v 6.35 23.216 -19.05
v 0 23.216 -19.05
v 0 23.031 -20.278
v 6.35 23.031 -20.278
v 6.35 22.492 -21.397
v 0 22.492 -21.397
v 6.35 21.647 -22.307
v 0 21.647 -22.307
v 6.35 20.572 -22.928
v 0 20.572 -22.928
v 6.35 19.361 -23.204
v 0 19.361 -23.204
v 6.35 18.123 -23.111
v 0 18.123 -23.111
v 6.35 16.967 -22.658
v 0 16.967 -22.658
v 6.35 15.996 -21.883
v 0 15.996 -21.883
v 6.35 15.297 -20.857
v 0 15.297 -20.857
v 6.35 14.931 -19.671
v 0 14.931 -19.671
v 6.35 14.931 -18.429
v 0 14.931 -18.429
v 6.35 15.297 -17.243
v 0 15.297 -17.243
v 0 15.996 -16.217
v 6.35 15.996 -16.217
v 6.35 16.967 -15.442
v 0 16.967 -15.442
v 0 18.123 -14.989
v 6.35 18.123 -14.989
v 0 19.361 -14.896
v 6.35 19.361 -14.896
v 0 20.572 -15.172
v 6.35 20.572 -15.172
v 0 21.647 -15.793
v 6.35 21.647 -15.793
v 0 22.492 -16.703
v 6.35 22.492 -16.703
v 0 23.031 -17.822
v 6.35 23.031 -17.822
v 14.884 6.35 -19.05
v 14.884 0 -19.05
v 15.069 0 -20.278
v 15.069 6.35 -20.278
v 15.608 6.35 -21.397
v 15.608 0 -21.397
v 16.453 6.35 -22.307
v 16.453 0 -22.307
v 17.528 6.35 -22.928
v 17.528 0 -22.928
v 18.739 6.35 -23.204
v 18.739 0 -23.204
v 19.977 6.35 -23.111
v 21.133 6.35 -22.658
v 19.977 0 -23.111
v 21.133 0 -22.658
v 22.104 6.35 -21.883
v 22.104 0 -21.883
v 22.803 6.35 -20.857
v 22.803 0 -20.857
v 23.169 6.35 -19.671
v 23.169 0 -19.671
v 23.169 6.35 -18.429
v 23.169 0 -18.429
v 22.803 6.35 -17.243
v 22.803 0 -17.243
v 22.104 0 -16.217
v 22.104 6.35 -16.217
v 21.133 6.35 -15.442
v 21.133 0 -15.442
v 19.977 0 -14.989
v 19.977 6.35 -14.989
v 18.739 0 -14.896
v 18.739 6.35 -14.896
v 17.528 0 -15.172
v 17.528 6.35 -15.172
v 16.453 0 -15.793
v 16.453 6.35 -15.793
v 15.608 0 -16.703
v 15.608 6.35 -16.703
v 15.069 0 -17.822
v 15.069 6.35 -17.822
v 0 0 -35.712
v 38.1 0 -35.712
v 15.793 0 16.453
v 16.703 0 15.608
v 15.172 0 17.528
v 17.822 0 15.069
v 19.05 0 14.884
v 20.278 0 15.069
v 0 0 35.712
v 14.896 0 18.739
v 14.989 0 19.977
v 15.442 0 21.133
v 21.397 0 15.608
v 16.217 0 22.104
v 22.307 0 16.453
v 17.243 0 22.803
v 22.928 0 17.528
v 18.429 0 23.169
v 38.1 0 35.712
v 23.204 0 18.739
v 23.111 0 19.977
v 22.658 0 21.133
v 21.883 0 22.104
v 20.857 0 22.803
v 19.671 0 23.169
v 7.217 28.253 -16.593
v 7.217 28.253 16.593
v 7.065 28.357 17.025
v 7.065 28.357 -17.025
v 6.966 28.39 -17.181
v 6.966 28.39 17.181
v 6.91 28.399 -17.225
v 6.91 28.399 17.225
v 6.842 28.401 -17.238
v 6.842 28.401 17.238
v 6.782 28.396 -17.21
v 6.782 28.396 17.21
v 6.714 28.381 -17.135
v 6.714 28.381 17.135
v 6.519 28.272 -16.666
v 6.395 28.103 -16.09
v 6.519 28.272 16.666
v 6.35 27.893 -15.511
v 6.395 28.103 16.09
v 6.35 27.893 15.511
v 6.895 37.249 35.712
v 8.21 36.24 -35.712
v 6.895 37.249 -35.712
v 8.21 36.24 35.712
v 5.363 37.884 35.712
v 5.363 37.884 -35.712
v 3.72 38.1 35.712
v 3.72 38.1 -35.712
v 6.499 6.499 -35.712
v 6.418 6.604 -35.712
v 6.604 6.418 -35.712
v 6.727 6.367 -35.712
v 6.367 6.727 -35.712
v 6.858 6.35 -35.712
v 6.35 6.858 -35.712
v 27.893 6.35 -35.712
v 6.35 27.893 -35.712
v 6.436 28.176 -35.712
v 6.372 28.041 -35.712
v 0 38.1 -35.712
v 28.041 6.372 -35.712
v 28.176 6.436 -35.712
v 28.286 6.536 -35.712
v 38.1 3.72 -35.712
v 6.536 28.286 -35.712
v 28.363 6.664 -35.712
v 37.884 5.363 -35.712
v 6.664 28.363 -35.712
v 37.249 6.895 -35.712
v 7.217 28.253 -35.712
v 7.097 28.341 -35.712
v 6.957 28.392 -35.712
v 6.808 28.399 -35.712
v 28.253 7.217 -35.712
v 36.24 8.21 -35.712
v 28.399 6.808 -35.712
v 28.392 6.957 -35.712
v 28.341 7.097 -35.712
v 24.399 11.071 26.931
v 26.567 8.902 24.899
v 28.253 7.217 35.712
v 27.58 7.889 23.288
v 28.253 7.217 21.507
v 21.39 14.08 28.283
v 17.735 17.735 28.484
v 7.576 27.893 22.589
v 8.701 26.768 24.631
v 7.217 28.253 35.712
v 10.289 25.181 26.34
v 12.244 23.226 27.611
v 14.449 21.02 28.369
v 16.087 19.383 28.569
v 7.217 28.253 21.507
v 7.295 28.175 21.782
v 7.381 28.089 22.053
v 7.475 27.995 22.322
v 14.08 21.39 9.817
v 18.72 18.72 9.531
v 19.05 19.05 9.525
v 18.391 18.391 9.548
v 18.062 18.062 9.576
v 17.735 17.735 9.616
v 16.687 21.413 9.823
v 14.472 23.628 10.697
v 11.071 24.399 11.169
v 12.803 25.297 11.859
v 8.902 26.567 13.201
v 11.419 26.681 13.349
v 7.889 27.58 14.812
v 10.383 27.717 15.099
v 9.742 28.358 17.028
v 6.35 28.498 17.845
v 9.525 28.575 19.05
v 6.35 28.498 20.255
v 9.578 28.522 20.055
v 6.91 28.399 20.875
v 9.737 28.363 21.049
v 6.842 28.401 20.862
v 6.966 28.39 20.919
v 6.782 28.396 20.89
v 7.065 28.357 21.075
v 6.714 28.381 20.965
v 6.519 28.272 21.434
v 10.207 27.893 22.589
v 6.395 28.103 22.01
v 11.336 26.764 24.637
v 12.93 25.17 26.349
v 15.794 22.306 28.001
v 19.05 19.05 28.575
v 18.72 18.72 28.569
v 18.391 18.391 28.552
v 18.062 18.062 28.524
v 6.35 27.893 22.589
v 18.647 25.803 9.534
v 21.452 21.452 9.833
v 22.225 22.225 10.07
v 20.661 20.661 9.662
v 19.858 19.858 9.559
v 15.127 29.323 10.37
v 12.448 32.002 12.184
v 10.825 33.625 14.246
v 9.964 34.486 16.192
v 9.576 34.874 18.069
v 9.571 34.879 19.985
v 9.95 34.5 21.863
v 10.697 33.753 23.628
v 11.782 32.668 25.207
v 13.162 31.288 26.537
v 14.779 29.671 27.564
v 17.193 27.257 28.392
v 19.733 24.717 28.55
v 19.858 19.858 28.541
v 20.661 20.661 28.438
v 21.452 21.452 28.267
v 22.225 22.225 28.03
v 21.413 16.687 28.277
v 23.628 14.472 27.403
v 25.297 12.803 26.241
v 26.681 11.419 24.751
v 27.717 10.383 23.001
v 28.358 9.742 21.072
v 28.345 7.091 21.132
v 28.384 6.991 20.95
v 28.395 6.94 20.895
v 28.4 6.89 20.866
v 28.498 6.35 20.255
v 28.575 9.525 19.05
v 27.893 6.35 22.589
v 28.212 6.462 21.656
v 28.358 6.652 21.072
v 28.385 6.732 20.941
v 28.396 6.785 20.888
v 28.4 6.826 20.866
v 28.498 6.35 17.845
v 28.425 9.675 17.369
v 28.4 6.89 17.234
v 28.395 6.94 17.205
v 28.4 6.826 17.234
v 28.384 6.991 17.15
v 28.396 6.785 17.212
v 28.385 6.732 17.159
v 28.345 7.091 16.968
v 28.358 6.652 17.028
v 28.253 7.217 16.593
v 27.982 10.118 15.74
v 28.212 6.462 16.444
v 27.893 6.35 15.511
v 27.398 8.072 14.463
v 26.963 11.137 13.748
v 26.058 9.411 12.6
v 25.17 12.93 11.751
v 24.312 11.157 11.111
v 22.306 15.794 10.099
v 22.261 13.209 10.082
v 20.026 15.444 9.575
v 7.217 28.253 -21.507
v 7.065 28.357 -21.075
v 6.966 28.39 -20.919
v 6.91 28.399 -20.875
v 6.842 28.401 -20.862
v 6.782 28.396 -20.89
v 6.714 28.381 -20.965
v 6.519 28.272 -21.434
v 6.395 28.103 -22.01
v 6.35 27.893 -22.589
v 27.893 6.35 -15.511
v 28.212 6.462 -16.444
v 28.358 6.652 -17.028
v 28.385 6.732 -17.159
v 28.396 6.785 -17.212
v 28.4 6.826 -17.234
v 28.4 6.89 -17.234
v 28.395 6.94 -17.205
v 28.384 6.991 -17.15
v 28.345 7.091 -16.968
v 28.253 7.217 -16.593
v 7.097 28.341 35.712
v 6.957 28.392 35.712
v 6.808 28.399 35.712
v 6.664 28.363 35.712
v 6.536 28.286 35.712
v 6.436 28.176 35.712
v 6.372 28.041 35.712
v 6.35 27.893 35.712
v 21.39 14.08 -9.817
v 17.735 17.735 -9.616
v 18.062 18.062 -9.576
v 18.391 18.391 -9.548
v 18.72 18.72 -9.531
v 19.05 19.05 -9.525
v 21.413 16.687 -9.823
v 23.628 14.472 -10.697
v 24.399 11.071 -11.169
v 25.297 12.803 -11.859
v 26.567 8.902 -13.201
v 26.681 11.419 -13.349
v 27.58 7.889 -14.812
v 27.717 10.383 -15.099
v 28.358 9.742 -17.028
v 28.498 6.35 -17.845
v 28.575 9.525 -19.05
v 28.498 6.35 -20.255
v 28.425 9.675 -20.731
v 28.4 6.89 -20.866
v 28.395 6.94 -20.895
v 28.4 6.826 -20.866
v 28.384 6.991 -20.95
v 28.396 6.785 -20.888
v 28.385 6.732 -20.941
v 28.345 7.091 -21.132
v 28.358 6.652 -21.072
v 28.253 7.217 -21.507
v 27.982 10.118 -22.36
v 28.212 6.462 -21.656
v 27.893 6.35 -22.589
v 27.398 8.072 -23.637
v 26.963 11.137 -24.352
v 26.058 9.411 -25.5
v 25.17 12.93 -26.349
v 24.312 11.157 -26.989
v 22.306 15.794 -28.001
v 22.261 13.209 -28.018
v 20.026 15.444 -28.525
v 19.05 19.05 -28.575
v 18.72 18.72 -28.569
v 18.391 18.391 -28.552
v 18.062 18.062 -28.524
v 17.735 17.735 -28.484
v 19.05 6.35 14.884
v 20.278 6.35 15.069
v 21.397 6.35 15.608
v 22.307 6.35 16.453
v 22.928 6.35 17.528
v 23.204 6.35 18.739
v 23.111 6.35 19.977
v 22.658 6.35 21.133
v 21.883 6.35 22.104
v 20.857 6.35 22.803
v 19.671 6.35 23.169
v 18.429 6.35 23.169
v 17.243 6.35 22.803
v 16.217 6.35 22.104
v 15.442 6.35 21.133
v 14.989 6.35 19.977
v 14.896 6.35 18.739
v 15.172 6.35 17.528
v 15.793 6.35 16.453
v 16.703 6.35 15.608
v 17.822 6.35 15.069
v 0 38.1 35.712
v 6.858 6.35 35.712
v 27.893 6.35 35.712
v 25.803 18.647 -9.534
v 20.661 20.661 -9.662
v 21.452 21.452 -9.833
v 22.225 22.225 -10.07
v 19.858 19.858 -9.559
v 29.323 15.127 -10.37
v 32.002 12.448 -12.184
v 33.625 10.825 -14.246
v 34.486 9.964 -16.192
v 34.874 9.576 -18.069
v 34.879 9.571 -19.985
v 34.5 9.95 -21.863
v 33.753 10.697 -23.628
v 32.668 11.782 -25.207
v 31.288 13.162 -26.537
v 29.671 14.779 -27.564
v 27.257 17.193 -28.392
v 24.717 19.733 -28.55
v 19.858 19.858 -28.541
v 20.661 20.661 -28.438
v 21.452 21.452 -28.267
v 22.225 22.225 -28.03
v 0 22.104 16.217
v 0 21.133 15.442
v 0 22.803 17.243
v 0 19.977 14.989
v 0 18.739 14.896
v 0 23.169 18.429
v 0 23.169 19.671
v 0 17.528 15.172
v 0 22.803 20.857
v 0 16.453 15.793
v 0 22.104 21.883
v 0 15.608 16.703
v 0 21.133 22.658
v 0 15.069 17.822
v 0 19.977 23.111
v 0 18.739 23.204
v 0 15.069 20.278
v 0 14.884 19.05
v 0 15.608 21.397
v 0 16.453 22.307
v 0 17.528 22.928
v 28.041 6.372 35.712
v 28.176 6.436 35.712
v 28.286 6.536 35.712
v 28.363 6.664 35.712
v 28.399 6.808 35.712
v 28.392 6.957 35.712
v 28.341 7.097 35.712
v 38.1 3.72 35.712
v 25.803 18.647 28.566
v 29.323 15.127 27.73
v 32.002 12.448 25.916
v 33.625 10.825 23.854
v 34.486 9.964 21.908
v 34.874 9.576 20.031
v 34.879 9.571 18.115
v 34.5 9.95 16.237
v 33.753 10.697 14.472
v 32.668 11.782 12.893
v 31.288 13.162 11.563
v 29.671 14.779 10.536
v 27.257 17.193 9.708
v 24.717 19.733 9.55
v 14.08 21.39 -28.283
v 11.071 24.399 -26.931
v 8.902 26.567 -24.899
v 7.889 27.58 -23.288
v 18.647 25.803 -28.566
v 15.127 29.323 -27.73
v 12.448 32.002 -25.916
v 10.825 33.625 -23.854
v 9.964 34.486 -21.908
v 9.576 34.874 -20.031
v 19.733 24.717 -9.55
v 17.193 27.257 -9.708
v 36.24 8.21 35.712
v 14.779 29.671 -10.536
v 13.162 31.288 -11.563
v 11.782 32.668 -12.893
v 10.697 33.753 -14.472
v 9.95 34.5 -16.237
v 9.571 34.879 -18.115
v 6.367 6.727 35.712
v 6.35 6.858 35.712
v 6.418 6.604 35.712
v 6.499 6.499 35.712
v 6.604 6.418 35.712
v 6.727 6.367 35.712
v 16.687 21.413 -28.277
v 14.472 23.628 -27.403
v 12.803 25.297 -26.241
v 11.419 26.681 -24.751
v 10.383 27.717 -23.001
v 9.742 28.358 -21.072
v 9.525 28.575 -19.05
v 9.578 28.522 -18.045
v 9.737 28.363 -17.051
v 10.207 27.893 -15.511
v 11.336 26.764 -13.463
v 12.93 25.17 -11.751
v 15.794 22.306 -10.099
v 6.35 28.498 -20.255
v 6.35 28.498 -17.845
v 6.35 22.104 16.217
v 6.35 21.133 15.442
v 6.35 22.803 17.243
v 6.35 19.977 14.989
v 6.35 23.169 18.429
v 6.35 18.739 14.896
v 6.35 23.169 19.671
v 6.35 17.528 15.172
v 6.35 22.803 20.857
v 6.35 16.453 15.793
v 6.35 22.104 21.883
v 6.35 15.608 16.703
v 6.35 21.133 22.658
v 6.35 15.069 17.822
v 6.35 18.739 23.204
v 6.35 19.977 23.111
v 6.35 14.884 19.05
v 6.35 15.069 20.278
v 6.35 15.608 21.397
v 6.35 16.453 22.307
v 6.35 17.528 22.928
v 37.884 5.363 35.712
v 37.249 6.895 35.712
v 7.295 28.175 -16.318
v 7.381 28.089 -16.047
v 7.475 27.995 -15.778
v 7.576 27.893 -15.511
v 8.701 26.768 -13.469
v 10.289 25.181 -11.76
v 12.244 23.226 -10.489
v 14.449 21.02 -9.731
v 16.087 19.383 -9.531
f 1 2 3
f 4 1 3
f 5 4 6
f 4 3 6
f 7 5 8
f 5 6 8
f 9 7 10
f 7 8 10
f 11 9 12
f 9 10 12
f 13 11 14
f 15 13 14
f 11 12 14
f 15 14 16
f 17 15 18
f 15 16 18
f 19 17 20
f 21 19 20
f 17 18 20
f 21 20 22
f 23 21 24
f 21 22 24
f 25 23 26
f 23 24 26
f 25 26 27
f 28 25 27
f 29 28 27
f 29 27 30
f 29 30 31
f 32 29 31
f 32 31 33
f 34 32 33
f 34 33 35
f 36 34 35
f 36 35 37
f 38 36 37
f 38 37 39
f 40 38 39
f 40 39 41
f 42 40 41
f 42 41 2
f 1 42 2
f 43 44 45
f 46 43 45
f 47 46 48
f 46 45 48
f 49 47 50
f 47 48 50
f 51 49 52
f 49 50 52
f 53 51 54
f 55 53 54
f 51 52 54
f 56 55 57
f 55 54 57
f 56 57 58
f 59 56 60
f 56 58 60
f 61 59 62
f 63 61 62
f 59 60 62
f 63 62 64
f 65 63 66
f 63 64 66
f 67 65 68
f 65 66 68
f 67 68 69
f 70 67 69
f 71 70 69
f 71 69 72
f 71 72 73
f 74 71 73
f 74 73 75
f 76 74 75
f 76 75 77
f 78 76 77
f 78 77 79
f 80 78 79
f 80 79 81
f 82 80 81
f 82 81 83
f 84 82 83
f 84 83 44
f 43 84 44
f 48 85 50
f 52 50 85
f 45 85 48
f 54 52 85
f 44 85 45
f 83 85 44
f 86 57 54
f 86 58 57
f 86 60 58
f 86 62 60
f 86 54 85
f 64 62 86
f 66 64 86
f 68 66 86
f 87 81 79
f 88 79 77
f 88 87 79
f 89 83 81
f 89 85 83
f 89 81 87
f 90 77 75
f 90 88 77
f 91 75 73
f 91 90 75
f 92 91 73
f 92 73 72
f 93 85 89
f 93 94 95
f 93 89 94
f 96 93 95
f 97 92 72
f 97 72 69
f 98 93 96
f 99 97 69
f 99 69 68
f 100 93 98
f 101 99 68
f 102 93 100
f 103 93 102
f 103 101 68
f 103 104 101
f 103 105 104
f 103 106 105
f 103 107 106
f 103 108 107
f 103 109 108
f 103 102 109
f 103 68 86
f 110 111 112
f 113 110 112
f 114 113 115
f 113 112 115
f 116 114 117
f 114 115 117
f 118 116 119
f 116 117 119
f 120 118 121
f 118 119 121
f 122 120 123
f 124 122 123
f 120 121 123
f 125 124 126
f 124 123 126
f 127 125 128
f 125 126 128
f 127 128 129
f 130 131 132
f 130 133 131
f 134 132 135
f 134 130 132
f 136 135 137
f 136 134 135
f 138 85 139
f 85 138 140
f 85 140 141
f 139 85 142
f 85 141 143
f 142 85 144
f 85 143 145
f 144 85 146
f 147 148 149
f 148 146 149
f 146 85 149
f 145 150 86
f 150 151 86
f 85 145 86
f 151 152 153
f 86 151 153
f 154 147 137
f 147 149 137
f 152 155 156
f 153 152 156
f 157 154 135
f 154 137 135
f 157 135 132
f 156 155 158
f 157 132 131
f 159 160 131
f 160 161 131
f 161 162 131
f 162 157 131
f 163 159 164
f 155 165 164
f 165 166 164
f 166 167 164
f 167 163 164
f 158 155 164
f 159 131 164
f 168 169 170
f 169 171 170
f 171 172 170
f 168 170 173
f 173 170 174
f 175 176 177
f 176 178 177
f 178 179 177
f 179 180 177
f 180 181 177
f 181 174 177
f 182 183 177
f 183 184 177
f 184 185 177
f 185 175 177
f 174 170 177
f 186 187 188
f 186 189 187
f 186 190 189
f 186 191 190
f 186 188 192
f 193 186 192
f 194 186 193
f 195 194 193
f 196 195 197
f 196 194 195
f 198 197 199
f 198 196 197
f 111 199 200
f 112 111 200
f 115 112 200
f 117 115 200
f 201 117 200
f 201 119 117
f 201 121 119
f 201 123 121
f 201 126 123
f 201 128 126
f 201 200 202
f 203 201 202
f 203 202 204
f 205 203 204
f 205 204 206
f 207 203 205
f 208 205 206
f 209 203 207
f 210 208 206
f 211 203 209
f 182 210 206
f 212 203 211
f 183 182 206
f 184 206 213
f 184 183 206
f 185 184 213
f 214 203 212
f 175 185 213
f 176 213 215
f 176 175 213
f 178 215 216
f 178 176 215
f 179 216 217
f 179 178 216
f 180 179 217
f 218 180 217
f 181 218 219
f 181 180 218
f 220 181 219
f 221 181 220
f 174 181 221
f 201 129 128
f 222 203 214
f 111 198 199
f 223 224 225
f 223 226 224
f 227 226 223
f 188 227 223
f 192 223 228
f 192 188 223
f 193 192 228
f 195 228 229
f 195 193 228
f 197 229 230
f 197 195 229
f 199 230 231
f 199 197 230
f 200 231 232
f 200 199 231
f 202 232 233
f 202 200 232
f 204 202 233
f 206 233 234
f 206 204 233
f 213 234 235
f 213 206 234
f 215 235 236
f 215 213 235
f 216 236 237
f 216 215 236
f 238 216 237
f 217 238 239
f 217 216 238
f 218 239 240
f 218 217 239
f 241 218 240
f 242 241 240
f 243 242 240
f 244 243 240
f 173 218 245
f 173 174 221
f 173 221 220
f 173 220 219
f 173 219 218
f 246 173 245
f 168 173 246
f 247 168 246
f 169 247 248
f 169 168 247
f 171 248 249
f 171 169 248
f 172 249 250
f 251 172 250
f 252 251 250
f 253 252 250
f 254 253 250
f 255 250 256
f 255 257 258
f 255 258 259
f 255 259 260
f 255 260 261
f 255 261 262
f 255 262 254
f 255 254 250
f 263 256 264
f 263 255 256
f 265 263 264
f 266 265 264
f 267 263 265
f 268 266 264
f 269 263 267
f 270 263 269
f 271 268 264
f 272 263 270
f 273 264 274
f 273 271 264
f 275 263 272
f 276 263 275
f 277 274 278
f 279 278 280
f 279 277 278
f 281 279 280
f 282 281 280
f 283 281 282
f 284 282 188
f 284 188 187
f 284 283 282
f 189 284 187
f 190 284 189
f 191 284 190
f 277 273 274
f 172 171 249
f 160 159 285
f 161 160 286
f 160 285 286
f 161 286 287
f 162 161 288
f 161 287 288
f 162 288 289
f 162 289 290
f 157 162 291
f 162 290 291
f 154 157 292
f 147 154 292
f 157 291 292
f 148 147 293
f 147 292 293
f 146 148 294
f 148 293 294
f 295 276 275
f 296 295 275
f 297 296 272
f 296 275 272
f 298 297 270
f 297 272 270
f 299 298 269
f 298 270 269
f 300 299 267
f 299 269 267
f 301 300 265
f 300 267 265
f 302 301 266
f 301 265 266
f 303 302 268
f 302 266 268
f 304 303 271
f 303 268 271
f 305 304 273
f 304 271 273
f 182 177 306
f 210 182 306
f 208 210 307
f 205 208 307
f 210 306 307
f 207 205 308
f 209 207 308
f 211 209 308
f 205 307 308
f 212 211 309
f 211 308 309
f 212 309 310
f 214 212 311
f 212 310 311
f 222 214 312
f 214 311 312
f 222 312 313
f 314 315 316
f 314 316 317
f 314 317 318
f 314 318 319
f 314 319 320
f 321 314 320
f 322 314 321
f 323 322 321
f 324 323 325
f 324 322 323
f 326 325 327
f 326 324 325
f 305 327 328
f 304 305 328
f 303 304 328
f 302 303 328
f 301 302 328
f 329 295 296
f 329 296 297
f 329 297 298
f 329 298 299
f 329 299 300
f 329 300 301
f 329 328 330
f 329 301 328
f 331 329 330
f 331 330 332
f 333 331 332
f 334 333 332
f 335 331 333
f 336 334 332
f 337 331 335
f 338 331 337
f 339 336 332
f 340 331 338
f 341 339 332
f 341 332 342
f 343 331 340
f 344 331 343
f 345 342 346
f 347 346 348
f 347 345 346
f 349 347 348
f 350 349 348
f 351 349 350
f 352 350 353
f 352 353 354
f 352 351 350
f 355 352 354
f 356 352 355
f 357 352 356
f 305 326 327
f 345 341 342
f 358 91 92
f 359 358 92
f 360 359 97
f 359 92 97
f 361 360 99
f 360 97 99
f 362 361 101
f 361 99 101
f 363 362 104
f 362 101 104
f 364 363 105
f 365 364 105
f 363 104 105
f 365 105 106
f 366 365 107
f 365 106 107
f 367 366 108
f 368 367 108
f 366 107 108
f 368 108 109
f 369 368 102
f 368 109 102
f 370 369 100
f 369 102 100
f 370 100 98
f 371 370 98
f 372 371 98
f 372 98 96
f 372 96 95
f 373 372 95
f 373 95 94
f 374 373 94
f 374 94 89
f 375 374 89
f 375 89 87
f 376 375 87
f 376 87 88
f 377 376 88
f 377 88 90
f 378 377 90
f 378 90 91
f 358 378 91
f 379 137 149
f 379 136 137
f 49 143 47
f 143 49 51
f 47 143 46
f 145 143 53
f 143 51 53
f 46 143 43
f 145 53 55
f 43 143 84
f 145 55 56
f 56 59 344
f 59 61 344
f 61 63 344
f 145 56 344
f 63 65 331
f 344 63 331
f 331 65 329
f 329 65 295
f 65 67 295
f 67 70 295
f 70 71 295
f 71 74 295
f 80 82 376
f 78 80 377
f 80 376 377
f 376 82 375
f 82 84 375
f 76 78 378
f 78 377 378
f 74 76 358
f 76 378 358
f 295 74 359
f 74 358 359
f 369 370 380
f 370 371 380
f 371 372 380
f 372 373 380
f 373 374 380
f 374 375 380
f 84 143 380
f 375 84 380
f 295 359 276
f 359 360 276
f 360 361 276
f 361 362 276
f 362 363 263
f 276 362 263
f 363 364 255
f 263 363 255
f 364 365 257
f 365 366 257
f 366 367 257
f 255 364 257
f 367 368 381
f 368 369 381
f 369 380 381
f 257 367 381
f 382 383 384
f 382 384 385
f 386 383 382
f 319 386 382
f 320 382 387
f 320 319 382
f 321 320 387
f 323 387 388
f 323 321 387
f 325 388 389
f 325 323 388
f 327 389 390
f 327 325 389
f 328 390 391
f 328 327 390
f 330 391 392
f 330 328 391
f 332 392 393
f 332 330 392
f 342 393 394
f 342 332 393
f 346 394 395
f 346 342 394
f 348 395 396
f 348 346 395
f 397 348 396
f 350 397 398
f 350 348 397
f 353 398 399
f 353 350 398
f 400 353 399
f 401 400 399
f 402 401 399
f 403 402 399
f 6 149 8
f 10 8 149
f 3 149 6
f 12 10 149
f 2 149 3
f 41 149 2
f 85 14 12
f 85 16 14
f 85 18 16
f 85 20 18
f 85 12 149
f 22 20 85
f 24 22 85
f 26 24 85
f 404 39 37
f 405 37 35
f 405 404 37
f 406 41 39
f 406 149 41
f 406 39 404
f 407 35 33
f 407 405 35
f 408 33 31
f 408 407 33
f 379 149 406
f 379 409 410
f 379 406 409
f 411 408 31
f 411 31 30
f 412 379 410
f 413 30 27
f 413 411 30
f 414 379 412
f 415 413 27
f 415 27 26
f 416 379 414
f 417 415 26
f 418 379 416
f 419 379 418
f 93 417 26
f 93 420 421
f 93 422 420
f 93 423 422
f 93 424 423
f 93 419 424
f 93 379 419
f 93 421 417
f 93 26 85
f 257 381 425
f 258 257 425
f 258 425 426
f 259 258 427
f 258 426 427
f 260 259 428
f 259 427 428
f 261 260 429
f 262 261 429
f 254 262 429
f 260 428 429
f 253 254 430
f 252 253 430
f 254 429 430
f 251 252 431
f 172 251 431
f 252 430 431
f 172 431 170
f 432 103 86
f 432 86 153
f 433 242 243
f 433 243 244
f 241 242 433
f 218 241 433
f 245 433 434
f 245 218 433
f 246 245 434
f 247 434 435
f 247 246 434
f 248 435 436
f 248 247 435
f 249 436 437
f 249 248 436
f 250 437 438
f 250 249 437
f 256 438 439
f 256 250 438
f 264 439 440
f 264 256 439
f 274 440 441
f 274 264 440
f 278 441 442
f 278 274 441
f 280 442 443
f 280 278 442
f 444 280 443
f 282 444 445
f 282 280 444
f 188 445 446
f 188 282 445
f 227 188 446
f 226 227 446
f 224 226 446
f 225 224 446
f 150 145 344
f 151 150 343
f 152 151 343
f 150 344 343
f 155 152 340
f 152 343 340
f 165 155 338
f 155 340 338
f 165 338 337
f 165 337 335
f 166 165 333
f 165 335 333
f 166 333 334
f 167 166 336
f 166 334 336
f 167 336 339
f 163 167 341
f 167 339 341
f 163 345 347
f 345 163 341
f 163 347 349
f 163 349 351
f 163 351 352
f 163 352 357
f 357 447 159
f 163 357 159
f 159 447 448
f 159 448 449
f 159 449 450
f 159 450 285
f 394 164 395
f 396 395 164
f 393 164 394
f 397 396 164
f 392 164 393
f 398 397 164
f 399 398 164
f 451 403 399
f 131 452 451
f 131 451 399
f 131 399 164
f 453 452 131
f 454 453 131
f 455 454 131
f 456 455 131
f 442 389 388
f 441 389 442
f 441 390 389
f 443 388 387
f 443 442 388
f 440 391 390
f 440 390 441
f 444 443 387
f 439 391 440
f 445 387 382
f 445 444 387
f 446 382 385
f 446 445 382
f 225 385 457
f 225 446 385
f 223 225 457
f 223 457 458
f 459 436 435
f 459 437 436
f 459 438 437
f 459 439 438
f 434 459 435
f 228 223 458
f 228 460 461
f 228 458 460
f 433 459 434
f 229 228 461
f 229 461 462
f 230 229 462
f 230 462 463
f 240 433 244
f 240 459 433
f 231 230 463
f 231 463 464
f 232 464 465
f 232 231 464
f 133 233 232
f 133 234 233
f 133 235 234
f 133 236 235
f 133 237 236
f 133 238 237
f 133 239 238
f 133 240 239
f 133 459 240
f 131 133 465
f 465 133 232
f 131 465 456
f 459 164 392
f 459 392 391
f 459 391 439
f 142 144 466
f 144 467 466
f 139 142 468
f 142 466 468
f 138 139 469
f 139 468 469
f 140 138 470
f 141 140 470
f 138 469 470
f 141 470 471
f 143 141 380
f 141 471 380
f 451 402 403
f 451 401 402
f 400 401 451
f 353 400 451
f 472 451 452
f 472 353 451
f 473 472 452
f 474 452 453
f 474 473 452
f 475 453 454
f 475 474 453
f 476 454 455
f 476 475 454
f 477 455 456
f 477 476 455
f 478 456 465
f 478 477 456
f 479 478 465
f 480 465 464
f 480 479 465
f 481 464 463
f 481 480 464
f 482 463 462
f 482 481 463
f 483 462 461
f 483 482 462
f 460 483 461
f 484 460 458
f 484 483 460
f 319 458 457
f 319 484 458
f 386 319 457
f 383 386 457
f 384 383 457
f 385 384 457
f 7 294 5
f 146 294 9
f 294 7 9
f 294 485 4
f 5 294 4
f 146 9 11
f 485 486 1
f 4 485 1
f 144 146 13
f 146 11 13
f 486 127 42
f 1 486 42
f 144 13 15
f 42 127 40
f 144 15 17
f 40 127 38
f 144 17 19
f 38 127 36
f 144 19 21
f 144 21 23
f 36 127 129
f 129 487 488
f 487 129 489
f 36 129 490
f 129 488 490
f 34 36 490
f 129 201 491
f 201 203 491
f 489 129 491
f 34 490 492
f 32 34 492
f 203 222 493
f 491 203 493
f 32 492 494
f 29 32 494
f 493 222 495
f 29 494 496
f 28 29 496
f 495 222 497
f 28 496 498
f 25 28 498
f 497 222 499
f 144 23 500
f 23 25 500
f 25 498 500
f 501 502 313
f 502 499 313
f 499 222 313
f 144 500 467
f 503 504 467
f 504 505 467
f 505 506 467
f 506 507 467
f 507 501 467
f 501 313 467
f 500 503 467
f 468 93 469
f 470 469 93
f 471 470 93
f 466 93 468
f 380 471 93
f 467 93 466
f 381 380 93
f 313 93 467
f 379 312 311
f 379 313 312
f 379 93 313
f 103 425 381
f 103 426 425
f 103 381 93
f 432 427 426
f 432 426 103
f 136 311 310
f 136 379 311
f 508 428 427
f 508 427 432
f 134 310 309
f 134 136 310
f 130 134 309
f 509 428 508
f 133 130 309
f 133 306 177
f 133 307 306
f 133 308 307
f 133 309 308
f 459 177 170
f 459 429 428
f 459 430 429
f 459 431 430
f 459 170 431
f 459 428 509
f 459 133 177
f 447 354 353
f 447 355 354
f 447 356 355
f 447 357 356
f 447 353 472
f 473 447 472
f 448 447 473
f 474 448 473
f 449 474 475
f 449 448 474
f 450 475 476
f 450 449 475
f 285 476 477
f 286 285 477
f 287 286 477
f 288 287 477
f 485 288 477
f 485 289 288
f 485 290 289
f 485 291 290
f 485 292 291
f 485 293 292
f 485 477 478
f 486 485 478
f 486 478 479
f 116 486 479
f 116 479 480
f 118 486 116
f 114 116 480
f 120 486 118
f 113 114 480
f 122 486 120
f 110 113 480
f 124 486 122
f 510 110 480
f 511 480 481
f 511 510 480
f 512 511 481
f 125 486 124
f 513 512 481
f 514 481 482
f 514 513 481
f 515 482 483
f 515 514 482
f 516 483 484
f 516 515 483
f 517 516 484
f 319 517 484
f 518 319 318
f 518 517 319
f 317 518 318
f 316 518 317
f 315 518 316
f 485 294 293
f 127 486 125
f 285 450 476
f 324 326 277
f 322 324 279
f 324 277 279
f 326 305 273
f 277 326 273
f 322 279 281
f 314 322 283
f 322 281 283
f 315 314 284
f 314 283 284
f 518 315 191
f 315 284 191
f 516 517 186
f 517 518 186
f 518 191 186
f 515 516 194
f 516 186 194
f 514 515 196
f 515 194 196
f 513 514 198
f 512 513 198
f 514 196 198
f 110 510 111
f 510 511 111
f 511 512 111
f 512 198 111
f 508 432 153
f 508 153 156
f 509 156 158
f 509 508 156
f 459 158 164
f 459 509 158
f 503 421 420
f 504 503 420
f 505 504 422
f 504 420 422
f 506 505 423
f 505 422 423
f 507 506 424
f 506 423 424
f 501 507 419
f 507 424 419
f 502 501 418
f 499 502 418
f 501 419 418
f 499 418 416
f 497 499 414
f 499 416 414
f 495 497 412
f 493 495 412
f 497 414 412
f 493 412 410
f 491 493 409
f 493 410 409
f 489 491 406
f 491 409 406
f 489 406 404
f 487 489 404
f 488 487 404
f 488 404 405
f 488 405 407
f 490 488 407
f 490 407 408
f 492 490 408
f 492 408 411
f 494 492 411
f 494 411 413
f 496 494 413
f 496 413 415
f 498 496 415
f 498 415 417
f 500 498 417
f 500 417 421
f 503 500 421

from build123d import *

# Parameters (mm, degrees)
BOSS_EXTRUDE2_DEPTH = 35.7124
CUT_EXTRUDE1_REACH  = 66.642
SKETCH3_R           = 4.1656
CUT_EXTRUDE2_REACH  = 66.642
SKETCH5_R           = 4.1656
SKETCH6_R           = 9.525
CUT_EXTRUDE3_DEPTH  = 47.498
SKETCH7_R           = 9.525
CUT_EXTRUDE4_DEPTH  = 47.498


with BuildPart() as part:
    # Sketch2 → Boss-Extrude2 (new, symmetric)
    with BuildSketch(Plane.XY):
        with BuildLine():
            Line((0, 38.1), (0, 0))
            Line((0, 0), (38.1, 0))
            Line((38.1, 0), (38.1, 3.719743879))
            ThreePointArc((38.1, 3.719743879), (37.616635031, 6.149783674), (36.240128061, 8.209871939))
            Line((36.240128061, 8.209871939), (8.209871939, 36.240128061))
            ThreePointArc((8.209871939, 36.240128061), (6.149783674, 37.616635031), (3.719743879, 38.1))
            Line((3.719743879, 38.1), (0, 38.1))
        make_face()
        with BuildLine():
            Line((6.35, 27.893323389), (6.35, 6.858))
            ThreePointArc((6.35, 6.858), (6.498789755, 6.498789755), (6.858, 6.35))
            Line((6.858, 6.35), (27.893323389, 6.35))
            ThreePointArc((27.893323389, 6.35), (28.362654192, 6.663596816), (28.252533634, 7.217210245))
            Line((28.252533634, 7.217210245), (7.217210245, 28.252533634))
            ThreePointArc((7.217210245, 28.252533634), (6.663596816, 28.362654192), (6.35, 27.893323389))
        make_face(mode=Mode.SUBTRACT)
    extrude(amount=BOSS_EXTRUDE2_DEPTH, both=True)

    # Sketch3 → Cut-Extrude1 (cut, up to next)
    with BuildSketch(Plane.ZY, mode=Mode.PRIVATE) as cut_extrude1_sk1:
        with Locations(Location((19.05, 19.05, 0), (0, 0, 270))):
            Circle(SKETCH3_R)
    cut_extrude1_tool1 = extrude(cut_extrude1_sk1.sketch, amount=-CUT_EXTRUDE1_REACH, mode=Mode.PRIVATE) & part.part
    # Sketch3 → Cut-Extrude1 (cut, up to next)
    with BuildSketch(Plane.ZY, mode=Mode.PRIVATE) as cut_extrude1_sk2:
        with Locations(Location((-19.05, 19.05, 0), (0, 0, 90))):
            Circle(SKETCH3_R)
    cut_extrude1_tool2 = extrude(cut_extrude1_sk2.sketch, amount=-CUT_EXTRUDE1_REACH, mode=Mode.PRIVATE) & part.part
    add(cut_extrude1_tool1.solids().sort_by_distance((0, 19.05, 19.05))[0], mode=Mode.SUBTRACT)
    add(cut_extrude1_tool2.solids().sort_by_distance((0, 19.05, -19.05))[0], mode=Mode.SUBTRACT)

    # Sketch5 → Cut-Extrude2 (cut, up to next)
    with BuildSketch(Plane.XZ, mode=Mode.PRIVATE) as cut_extrude2_sk1:
        with Locations(Location((19.05, 19.05, 0), (0, 0, 270))):
            Circle(SKETCH5_R)
    cut_extrude2_tool1 = extrude(cut_extrude2_sk1.sketch, amount=-CUT_EXTRUDE2_REACH, mode=Mode.PRIVATE) & part.part
    # Sketch5 → Cut-Extrude2 (cut, up to next)
    with BuildSketch(Plane.XZ, mode=Mode.PRIVATE) as cut_extrude2_sk2:
        with Locations(Location((19.05, -19.05, 0), (0, 0, 180))):
            Circle(SKETCH5_R)
    cut_extrude2_tool2 = extrude(cut_extrude2_sk2.sketch, amount=-CUT_EXTRUDE2_REACH, mode=Mode.PRIVATE) & part.part
    add(cut_extrude2_tool1.solids().sort_by_distance((19.05, 0, 19.05))[0], mode=Mode.SUBTRACT)
    add(cut_extrude2_tool2.solids().sort_by_distance((19.05, 0, -19.05))[0], mode=Mode.SUBTRACT)

    # Sketch6 → Cut-Extrude3 (cut)
    with BuildSketch(Plane(origin=(6.35, 0, 0), x_dir=(0, 0, -1), z_dir=(1, 0, 0))):
        with Locations(Location((-19.05, 19.05, 0), (0, 0, 111.808163998))):
            Circle(SKETCH6_R)
        with Locations(Location((19.05, 19.05, 0), (0, 0, 111.808163998))):
            Circle(SKETCH6_R)
    extrude(amount=CUT_EXTRUDE3_DEPTH, mode=Mode.SUBTRACT)

    # Sketch7 → Cut-Extrude4 (cut)
    with BuildSketch(Plane(origin=(0, 6.35, 0), x_dir=(1, 0, 0), z_dir=(0, 1, 0))):
        with Locations((19.05, 19.05)):
            Circle(SKETCH7_R)
        with Locations((19.05, -19.05)):
            Circle(SKETCH7_R)
    extrude(amount=CUT_EXTRUDE4_DEPTH, mode=Mode.SUBTRACT)


solid = part.part
